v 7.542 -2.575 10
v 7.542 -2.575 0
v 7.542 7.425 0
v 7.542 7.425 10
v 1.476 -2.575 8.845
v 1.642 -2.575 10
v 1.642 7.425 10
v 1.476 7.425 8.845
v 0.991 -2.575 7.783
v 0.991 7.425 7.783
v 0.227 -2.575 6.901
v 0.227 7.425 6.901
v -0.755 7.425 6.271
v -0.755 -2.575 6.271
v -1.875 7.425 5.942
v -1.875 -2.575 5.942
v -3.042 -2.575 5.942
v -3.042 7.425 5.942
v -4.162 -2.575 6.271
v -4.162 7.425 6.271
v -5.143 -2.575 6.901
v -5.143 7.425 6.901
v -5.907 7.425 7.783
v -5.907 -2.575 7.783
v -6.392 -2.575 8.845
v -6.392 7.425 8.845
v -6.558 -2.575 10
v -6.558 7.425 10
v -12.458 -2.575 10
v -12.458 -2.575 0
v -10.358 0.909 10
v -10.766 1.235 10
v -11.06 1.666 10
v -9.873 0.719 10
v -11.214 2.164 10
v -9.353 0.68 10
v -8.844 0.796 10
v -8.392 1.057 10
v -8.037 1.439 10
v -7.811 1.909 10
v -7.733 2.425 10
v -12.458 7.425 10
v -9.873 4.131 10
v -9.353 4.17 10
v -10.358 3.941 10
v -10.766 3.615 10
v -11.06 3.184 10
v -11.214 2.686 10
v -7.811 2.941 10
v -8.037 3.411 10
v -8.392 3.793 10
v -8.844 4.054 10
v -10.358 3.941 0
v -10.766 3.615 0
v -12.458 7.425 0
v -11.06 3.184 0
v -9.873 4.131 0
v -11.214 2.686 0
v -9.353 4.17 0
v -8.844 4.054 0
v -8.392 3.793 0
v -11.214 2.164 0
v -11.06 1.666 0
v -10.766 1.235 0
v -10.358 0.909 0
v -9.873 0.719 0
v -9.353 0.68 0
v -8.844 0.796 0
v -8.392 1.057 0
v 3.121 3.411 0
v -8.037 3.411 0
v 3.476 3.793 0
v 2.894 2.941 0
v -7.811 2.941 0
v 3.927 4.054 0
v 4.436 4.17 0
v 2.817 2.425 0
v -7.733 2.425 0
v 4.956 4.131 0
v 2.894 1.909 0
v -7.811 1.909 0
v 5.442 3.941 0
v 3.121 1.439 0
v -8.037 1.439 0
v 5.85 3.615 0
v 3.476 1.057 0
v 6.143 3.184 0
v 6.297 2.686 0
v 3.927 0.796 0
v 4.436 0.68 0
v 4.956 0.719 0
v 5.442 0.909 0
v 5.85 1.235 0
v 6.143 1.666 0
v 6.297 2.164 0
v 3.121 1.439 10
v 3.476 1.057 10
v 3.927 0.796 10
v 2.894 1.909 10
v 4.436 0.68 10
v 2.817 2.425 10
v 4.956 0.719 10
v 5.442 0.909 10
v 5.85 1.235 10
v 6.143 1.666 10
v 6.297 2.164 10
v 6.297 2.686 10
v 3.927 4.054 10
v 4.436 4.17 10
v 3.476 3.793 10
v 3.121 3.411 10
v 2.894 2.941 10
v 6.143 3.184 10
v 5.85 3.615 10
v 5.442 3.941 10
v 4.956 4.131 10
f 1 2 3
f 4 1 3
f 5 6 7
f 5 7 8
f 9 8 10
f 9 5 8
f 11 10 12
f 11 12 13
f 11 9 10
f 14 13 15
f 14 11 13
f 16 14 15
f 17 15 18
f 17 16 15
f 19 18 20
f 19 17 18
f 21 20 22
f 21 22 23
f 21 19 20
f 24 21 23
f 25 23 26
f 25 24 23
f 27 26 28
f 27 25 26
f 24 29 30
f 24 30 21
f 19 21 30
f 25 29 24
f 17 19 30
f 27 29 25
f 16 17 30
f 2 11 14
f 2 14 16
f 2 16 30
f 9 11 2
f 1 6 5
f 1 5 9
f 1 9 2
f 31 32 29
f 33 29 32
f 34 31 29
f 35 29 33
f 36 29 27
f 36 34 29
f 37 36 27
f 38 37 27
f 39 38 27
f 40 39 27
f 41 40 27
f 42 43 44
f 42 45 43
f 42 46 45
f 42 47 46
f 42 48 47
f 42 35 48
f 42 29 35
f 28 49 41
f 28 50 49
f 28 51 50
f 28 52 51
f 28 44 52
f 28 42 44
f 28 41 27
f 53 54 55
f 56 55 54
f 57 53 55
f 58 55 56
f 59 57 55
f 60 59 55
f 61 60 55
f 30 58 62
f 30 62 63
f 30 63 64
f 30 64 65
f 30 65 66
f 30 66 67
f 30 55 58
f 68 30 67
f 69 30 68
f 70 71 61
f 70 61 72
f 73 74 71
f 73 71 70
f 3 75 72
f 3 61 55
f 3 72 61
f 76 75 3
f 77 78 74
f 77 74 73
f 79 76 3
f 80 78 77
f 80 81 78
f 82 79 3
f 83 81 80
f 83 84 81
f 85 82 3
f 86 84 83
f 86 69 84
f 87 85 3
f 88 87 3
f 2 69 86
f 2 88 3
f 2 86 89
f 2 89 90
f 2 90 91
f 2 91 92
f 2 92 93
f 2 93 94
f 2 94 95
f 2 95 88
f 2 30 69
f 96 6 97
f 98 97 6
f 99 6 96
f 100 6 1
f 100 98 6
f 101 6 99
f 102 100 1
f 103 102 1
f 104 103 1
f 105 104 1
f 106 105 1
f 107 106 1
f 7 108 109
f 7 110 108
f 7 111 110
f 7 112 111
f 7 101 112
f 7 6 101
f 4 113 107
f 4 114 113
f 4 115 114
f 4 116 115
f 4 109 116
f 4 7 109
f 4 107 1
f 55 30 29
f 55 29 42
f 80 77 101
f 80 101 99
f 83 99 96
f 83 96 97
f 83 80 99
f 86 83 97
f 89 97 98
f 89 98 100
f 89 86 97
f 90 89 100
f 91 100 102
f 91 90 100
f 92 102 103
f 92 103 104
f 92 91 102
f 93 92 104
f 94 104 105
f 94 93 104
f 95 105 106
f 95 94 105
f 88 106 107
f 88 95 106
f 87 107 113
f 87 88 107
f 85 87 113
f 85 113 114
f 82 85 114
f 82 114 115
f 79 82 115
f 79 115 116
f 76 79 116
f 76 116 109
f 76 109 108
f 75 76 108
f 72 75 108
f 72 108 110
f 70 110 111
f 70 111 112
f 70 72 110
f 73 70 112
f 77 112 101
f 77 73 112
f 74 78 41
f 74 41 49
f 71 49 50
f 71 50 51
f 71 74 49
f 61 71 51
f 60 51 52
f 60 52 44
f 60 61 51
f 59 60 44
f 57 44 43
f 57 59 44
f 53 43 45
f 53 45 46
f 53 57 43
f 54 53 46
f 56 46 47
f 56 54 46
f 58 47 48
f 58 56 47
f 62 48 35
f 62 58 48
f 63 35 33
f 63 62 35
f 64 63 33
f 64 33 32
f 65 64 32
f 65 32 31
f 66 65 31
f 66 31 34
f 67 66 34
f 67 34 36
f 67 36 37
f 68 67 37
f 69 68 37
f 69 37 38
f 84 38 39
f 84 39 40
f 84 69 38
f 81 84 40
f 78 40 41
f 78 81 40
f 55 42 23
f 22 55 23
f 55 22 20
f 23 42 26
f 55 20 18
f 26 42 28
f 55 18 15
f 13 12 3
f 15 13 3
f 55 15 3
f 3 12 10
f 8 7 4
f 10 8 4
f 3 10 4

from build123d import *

# Parameters (mm, degrees)
CROQUIS1_W                = 5.9
CROQUIS1_H                = 10
CROQUIS1_R                = 1.75
SALIENTE_EXTRUIR1_DEPTH   = 10
SALIENTE_EXTRUIR1_2_DEPTH = 10
SALIENTE_EXTRUIR2_DEPTH   = 10


with BuildPart() as part:
    # Croquis1 → Saliente-Extruir1 (new body)
    with BuildSketch(Plane.XY):
        with Locations((-9.508333333, 2.425)):
            Rectangle(CROQUIS1_W, CROQUIS1_H)
        with Locations((-9.483333333, 2.425)):
            Circle(CROQUIS1_R, mode=Mode.SUBTRACT)
    extrude(amount=SALIENTE_EXTRUIR1_DEPTH)



with BuildPart() as body_2:
    # Croquis1 → Saliente-Extruir1 2 (new body)
    with BuildSketch(Plane.XY):
        with Locations((4.591666667, 2.425)):
            Rectangle(CROQUIS1_W, CROQUIS1_H)
        with Locations(Location((4.566666667, 2.425, 0), (0, 0, 180))):
            Circle(CROQUIS1_R, mode=Mode.SUBTRACT)
    extrude(amount=SALIENTE_EXTRUIR1_2_DEPTH)


with BuildPart() as part_1:
    add(part.part)

    add(body_2.part)  # Saliente-Extruir2 merges body 2
    # Croquis3 → Saliente-Extruir2 (add)
    with BuildSketch(Plane.XZ.offset(2.575)):
        with BuildLine():
            Line((-6.558333333, 10), (-6.558333333, 0))
            Line((-6.558333333, 0), (1.641666667, 0))
            Line((1.641666667, 0), (1.641666667, 10))
            ThreePointArc((1.641666667, 10), (-2.458333333, 5.9), (-6.558333333, 10))
        make_face()
    extrude(amount=-SALIENTE_EXTRUIR2_DEPTH)


solid = part_1.part
